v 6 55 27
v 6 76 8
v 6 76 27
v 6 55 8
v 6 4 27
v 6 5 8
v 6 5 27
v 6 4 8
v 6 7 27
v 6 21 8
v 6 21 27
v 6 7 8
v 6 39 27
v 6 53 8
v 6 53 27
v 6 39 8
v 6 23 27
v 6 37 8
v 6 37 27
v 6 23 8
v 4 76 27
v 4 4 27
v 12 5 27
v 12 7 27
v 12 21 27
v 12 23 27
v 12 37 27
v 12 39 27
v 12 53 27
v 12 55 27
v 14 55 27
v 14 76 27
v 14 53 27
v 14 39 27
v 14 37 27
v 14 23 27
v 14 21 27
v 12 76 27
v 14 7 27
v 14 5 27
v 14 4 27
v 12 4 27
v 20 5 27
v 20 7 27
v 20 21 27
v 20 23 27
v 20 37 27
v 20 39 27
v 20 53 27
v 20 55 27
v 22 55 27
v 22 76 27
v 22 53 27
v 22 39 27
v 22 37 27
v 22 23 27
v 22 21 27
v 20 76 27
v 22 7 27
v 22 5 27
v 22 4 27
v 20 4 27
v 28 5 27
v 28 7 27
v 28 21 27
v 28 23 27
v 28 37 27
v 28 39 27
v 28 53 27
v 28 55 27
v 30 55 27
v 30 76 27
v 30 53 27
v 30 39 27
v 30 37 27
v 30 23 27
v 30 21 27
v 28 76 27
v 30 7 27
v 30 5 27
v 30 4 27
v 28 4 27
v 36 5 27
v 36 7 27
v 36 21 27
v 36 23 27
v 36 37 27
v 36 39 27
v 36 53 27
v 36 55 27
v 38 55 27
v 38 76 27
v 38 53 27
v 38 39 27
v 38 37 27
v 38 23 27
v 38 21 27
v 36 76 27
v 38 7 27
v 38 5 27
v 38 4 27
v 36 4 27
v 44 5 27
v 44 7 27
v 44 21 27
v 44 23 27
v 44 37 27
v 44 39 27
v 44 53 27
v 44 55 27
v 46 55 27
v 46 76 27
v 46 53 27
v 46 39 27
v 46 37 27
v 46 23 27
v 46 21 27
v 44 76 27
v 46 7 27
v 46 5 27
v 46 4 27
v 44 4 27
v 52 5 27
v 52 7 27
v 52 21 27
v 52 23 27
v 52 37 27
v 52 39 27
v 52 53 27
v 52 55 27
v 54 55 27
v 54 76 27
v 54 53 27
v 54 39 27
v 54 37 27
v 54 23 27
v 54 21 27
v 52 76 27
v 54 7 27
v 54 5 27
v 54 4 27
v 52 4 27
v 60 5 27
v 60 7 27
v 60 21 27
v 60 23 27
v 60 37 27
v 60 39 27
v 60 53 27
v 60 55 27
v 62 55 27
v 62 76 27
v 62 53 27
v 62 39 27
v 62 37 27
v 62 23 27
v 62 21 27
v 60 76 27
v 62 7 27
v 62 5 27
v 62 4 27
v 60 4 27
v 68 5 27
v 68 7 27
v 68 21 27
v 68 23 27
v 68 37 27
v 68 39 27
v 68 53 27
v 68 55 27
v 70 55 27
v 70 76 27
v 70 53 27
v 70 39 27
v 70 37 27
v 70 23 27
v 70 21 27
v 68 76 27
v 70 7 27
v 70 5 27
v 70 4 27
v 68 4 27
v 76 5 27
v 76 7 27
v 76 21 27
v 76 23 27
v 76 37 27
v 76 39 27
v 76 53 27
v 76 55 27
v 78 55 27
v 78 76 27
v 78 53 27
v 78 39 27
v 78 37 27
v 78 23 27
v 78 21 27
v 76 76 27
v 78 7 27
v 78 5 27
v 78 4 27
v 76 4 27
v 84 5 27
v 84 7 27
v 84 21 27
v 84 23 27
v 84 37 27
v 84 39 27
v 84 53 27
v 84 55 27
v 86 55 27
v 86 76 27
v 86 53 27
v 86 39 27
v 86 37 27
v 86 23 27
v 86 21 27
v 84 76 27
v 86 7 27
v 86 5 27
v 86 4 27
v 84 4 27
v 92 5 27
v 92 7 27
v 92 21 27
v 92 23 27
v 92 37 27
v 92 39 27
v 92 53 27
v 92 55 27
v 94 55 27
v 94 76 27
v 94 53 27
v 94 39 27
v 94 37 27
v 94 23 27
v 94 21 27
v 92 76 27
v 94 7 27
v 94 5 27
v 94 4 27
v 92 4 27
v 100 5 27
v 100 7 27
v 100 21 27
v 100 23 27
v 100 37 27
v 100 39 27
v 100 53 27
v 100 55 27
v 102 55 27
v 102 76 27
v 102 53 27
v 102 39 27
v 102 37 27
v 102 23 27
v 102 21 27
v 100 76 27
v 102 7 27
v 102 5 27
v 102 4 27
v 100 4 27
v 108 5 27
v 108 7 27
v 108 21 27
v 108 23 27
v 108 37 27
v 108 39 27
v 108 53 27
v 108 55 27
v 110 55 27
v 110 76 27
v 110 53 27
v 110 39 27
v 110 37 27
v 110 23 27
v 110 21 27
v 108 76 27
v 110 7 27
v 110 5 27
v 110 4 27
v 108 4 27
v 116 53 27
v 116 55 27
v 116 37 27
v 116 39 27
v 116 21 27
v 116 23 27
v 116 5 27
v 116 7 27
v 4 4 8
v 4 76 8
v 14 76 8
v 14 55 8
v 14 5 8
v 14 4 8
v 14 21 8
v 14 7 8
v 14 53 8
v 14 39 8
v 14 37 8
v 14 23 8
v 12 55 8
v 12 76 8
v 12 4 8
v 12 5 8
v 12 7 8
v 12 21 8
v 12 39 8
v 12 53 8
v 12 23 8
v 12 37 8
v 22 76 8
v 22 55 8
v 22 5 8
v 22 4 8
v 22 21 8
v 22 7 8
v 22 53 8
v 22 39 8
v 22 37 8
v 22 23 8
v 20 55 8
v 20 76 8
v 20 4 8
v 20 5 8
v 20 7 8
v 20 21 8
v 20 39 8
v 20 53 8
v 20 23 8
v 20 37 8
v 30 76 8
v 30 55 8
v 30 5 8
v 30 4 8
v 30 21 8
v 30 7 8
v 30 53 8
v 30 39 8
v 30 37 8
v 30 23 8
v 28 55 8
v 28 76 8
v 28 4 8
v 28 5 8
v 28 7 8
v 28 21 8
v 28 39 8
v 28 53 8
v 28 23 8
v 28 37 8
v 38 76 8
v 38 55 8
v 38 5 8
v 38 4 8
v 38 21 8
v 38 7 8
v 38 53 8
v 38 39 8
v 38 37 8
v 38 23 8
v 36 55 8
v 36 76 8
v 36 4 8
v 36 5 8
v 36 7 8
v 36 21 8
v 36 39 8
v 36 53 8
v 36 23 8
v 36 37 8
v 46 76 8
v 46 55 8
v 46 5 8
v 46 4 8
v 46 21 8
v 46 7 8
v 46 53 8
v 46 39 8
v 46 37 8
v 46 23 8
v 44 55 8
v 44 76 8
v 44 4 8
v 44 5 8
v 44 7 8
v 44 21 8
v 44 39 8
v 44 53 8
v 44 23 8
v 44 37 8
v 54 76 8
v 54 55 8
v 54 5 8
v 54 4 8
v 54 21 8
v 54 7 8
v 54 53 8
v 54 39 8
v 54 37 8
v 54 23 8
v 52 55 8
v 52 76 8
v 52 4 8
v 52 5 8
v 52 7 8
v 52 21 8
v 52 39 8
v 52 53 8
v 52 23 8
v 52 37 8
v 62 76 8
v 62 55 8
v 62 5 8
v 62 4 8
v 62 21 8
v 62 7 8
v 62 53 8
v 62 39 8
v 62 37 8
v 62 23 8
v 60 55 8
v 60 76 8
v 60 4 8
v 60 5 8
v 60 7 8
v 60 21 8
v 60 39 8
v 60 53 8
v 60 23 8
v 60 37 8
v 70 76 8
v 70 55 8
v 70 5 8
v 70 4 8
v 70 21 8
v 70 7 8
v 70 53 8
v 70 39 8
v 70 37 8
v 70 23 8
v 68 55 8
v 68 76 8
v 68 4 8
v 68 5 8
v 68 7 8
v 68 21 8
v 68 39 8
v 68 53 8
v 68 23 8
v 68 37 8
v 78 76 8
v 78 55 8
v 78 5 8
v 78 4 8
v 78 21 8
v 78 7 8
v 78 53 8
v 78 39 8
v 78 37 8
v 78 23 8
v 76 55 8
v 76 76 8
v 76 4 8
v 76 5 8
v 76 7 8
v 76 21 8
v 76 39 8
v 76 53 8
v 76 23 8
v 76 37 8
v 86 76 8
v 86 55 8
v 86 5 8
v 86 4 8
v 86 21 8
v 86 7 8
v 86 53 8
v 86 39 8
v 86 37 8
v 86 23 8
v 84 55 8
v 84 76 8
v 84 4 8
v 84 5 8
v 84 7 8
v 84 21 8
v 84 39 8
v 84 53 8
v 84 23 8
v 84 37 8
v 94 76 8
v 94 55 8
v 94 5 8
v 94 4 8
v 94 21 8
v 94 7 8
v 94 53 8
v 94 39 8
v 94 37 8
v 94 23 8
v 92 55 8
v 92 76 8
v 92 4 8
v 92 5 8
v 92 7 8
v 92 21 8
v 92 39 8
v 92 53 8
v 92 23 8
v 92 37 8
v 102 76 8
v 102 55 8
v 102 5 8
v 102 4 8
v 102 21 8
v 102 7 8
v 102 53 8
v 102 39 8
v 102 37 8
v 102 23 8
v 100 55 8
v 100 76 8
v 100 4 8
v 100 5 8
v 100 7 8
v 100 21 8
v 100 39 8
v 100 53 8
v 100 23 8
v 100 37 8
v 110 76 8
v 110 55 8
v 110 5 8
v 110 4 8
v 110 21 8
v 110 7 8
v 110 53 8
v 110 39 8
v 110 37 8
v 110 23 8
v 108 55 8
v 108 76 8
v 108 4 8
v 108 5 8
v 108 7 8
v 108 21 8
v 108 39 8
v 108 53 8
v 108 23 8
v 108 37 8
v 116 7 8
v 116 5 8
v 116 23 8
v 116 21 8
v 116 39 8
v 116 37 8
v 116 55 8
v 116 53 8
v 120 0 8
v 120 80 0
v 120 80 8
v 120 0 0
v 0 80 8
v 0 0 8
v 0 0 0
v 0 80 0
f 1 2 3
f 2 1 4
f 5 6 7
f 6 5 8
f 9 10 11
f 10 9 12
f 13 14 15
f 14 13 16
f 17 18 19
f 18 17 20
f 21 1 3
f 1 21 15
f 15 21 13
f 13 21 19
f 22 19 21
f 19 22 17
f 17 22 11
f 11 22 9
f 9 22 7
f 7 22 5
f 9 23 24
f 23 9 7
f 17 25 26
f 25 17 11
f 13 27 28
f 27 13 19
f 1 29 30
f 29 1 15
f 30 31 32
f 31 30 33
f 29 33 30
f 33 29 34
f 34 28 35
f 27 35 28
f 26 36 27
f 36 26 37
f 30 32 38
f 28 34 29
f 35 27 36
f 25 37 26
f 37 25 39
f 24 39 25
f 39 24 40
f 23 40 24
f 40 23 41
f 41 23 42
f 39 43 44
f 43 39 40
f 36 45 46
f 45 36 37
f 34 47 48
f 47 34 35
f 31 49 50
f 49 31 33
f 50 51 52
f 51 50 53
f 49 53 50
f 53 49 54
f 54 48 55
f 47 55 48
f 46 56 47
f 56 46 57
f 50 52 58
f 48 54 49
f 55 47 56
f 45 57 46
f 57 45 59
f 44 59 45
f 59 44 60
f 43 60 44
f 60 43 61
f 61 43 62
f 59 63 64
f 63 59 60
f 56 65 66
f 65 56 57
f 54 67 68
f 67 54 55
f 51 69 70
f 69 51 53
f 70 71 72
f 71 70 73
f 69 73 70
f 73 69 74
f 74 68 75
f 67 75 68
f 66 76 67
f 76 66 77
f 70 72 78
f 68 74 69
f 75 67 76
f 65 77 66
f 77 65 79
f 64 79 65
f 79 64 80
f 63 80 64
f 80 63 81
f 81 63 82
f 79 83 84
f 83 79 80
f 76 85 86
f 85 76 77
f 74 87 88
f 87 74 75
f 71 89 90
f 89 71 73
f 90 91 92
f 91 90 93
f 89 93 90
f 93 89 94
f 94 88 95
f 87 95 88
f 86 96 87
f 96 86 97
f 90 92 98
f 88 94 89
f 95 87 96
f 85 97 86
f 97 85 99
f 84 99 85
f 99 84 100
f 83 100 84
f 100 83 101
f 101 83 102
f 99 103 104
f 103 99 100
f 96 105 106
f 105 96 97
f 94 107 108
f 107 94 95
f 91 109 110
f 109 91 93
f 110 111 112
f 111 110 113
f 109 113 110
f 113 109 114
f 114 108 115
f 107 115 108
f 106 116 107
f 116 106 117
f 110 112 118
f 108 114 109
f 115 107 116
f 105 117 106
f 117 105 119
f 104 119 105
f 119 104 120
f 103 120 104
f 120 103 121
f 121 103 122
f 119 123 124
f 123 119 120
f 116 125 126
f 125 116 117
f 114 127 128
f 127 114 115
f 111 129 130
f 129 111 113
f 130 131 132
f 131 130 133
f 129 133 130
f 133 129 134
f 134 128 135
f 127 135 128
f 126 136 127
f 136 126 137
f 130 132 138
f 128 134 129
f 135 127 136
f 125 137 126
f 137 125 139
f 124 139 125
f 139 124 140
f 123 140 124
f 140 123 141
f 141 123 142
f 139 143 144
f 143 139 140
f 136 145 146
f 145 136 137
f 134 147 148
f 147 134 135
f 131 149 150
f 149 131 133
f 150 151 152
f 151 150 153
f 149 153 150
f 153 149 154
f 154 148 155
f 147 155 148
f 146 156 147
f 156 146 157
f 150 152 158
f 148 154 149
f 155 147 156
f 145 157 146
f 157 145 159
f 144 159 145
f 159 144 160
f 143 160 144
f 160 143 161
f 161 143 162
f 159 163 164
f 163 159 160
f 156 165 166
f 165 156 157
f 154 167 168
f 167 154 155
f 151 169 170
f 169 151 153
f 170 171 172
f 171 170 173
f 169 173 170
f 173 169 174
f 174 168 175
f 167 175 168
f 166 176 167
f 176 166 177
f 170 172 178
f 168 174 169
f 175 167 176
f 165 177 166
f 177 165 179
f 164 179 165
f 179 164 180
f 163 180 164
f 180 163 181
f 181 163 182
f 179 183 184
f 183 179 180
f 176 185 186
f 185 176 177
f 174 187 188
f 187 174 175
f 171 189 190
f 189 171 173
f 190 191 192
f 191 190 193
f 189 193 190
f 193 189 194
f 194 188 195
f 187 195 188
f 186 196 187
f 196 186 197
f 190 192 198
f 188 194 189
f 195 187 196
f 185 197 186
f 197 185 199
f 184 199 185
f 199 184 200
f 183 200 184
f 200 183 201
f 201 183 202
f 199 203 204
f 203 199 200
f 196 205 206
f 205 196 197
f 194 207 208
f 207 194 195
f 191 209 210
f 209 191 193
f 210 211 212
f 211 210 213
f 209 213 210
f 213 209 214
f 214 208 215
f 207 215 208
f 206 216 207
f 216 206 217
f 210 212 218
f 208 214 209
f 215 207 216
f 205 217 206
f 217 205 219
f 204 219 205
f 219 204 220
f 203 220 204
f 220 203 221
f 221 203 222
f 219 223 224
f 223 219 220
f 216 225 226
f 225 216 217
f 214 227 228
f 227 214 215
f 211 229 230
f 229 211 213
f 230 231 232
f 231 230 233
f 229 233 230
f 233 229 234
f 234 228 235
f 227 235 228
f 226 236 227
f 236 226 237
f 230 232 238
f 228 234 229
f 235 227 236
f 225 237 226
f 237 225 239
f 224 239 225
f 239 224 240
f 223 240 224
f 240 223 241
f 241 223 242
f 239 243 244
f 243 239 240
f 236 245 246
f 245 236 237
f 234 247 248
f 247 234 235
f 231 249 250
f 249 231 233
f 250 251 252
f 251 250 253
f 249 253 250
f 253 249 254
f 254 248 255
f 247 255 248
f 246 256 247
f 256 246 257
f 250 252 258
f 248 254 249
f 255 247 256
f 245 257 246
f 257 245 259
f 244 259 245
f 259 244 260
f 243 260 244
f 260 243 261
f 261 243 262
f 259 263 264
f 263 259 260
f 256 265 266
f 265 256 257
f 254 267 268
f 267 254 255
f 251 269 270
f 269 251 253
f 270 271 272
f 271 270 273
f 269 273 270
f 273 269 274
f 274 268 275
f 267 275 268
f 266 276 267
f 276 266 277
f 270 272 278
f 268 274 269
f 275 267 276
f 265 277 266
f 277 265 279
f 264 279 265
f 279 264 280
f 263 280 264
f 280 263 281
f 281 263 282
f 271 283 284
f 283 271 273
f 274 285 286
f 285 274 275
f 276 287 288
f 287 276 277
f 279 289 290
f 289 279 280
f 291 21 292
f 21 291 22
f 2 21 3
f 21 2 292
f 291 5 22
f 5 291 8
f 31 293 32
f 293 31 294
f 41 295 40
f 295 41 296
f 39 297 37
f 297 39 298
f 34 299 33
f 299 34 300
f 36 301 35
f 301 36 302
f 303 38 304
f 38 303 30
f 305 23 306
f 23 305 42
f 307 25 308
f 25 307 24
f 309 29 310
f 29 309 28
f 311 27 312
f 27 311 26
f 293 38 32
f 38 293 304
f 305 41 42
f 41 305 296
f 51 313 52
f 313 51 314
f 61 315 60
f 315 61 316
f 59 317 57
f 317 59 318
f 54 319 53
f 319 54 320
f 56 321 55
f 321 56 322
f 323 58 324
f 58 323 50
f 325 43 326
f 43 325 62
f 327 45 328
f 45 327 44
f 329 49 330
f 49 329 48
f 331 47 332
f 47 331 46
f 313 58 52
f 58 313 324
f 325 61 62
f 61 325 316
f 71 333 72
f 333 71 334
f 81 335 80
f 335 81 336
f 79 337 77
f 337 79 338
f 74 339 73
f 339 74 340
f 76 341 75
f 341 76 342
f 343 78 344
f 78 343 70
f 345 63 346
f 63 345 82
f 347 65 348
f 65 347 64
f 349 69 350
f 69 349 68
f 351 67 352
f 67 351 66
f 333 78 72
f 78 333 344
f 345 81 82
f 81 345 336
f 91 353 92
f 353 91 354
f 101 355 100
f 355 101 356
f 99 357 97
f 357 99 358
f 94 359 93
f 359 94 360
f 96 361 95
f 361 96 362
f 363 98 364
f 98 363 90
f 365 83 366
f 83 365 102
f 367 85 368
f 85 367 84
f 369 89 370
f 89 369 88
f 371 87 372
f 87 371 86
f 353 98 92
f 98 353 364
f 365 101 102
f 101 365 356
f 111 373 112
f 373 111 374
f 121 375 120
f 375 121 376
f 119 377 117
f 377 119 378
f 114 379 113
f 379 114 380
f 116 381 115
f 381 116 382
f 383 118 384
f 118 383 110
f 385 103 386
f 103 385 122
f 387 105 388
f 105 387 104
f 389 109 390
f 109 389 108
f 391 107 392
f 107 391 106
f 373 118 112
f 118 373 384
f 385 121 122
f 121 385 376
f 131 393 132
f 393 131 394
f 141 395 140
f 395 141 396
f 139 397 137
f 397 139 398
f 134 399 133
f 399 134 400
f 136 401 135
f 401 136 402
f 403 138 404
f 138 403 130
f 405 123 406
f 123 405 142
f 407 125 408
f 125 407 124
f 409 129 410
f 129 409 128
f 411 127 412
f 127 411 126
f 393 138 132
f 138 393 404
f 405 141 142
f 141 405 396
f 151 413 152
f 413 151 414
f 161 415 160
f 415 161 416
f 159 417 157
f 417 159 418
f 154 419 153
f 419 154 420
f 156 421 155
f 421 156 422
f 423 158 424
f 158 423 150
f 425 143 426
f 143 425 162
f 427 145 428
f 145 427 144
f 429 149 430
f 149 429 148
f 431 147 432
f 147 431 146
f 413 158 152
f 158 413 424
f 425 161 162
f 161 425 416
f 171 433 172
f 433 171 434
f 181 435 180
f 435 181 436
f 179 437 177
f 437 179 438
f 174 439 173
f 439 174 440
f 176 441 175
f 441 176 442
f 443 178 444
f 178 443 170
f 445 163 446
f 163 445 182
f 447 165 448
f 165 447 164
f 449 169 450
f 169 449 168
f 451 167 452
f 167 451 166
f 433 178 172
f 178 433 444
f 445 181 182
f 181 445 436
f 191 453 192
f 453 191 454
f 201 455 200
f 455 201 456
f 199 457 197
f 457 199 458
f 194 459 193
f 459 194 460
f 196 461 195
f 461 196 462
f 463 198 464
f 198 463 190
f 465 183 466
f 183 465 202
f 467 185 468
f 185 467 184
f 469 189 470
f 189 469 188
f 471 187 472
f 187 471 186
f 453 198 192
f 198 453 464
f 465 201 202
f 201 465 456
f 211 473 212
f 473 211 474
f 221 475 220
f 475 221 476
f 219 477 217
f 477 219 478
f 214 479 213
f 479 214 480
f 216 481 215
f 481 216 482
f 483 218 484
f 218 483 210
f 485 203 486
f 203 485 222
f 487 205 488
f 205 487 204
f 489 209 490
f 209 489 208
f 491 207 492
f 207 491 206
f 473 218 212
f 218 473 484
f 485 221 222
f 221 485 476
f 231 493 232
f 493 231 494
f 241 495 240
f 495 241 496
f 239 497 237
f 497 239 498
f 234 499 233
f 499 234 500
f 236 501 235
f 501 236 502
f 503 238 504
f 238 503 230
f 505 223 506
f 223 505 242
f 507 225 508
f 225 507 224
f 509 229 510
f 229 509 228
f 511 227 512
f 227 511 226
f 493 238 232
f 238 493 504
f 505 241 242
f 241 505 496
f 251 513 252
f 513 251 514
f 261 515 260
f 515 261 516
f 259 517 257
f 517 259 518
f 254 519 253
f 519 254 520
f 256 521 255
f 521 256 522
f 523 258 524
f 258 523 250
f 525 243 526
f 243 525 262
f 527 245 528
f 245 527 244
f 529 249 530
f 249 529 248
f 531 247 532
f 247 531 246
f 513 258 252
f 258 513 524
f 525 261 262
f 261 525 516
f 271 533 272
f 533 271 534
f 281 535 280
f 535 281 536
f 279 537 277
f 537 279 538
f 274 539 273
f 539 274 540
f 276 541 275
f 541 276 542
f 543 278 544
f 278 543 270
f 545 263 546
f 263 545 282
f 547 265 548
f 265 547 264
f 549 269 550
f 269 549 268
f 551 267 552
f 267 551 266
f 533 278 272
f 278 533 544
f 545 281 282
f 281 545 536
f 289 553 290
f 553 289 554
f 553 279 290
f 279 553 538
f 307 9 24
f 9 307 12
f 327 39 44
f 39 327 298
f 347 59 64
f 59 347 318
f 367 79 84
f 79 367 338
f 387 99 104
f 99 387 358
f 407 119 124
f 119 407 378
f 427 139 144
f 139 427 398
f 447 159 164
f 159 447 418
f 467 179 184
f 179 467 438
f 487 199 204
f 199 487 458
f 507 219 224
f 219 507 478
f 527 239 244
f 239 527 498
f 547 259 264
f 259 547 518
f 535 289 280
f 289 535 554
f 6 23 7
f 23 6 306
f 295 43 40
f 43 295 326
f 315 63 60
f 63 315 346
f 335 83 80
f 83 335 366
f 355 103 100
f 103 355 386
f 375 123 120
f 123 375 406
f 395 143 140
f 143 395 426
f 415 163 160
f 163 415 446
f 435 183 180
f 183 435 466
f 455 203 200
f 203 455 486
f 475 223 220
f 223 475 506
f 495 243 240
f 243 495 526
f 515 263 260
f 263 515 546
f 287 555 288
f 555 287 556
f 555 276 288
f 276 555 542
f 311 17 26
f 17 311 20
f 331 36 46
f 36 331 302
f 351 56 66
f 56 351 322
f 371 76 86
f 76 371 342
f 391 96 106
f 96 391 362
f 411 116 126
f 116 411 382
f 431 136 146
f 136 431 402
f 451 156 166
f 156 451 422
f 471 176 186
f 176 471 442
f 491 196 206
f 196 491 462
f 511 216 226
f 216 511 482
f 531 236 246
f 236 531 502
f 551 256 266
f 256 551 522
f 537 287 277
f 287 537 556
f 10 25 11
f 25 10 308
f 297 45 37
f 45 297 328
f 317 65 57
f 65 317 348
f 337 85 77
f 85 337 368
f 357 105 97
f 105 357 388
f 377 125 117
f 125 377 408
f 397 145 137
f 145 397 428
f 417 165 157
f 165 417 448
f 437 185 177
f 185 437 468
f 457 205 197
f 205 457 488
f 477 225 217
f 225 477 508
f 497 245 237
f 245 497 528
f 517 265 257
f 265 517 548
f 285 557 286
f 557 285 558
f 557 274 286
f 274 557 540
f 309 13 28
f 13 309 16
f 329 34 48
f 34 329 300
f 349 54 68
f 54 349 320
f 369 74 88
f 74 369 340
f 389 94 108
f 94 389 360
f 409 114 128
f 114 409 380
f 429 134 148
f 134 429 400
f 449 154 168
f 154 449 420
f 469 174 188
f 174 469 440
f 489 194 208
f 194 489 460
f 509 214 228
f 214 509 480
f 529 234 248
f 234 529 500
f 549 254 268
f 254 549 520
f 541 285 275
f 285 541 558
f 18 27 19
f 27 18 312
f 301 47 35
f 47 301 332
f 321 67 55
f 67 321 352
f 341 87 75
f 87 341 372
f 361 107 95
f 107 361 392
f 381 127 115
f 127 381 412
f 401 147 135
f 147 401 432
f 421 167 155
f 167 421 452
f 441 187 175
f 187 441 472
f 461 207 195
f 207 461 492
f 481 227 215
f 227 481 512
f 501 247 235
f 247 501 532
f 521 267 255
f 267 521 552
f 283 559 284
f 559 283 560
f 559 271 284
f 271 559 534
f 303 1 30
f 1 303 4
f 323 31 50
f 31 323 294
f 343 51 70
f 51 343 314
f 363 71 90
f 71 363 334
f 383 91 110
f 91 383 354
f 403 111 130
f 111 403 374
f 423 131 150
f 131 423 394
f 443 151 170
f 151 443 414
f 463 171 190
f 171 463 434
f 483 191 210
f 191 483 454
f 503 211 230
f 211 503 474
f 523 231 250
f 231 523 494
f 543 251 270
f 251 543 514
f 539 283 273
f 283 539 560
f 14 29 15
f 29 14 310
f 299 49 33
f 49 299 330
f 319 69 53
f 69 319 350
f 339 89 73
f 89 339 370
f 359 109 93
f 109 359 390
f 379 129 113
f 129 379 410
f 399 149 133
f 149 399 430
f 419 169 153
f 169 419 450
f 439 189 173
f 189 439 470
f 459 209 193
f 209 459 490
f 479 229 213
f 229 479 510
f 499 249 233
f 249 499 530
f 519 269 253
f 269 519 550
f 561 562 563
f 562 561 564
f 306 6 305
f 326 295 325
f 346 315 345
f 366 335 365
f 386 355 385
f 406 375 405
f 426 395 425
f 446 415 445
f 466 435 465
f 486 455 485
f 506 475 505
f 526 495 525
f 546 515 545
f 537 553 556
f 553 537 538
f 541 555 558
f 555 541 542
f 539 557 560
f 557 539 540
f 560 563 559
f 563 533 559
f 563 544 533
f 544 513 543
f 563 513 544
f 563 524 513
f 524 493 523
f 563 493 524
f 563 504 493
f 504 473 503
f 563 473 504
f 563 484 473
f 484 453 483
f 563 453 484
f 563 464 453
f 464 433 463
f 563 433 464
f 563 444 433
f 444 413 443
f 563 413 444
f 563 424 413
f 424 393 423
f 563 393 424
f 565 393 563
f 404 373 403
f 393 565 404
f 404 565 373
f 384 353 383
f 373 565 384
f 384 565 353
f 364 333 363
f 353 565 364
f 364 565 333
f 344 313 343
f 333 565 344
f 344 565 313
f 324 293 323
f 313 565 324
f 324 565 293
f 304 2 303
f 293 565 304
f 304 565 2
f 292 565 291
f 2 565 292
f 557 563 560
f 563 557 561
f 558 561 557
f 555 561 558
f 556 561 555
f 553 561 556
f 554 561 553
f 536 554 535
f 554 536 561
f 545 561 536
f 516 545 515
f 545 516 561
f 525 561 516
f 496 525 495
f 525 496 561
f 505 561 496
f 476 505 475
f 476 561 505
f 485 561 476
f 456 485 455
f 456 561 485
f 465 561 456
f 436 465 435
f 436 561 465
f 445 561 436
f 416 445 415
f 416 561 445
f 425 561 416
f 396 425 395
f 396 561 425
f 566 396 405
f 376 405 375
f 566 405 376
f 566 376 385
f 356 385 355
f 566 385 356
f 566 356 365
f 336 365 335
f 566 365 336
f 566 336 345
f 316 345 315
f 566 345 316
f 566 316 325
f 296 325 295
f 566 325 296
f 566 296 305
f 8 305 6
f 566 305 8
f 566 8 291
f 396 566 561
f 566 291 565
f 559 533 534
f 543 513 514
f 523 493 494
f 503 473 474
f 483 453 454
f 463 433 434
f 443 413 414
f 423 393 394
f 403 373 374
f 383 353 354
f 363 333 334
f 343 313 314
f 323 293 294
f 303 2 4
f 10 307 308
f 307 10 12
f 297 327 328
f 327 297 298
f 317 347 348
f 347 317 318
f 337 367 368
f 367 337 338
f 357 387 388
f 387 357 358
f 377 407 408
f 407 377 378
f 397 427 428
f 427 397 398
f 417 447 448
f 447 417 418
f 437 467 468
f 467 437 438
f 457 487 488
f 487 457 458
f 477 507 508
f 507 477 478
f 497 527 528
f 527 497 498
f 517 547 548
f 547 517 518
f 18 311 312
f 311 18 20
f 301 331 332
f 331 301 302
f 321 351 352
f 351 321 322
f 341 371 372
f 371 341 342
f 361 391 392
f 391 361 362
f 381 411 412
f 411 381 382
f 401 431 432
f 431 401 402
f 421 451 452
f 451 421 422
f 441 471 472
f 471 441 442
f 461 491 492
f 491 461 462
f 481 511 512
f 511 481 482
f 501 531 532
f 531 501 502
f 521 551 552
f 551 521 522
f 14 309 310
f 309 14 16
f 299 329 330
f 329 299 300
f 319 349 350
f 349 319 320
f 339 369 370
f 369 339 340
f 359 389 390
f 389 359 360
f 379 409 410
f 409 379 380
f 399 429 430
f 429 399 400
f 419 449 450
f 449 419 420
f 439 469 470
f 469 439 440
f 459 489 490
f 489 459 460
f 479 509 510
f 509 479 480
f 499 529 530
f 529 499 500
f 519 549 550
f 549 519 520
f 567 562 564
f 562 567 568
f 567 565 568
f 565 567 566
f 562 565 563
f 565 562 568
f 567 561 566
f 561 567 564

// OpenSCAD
$fn = 32;

// ----------------------------------------------------------------------
// Heatsink: cross fin block
// ----------------------------------------------------------------------

// --- parameters (mm) ---
base_l = 120;             // base length, X
base_w = 80;              // base width, Y
base_t = 8;               // base plate thickness
fin_h = 20;               // fin height above the base
fin_t = 2;                // fin thickness
edge = 4;                 // margin from the base ends
pitch = 8;                // fin pitch
rib_pitch = 16;           // cross rib pitch
fit_tol = 0.05;           // tolerance for press fits, mm
free_tol = 0.2;           // tolerance for clearance fits, mm

n_fins = floor((base_l - 2 * edge - fin_t) / pitch) + 1;  // fin count
total_h = base_t + fin_h - 1;  // overall height
n_ribs = floor((base_w - 2 * edge) / rib_pitch);  // rib count

union() {
  cube([base_l, base_w, base_t]);
  for (i = [0 : n_fins - 1])
    translate([edge + i * pitch, edge, base_t - 1])
      cube([fin_t, base_w - 2 * edge, fin_h]);
  for (i = [0 : n_ribs - 1])
    translate([edge, edge + 1 + i * rib_pitch, base_t - 1])
      cube([base_l - 2 * edge, fin_t, fin_h]);
}
